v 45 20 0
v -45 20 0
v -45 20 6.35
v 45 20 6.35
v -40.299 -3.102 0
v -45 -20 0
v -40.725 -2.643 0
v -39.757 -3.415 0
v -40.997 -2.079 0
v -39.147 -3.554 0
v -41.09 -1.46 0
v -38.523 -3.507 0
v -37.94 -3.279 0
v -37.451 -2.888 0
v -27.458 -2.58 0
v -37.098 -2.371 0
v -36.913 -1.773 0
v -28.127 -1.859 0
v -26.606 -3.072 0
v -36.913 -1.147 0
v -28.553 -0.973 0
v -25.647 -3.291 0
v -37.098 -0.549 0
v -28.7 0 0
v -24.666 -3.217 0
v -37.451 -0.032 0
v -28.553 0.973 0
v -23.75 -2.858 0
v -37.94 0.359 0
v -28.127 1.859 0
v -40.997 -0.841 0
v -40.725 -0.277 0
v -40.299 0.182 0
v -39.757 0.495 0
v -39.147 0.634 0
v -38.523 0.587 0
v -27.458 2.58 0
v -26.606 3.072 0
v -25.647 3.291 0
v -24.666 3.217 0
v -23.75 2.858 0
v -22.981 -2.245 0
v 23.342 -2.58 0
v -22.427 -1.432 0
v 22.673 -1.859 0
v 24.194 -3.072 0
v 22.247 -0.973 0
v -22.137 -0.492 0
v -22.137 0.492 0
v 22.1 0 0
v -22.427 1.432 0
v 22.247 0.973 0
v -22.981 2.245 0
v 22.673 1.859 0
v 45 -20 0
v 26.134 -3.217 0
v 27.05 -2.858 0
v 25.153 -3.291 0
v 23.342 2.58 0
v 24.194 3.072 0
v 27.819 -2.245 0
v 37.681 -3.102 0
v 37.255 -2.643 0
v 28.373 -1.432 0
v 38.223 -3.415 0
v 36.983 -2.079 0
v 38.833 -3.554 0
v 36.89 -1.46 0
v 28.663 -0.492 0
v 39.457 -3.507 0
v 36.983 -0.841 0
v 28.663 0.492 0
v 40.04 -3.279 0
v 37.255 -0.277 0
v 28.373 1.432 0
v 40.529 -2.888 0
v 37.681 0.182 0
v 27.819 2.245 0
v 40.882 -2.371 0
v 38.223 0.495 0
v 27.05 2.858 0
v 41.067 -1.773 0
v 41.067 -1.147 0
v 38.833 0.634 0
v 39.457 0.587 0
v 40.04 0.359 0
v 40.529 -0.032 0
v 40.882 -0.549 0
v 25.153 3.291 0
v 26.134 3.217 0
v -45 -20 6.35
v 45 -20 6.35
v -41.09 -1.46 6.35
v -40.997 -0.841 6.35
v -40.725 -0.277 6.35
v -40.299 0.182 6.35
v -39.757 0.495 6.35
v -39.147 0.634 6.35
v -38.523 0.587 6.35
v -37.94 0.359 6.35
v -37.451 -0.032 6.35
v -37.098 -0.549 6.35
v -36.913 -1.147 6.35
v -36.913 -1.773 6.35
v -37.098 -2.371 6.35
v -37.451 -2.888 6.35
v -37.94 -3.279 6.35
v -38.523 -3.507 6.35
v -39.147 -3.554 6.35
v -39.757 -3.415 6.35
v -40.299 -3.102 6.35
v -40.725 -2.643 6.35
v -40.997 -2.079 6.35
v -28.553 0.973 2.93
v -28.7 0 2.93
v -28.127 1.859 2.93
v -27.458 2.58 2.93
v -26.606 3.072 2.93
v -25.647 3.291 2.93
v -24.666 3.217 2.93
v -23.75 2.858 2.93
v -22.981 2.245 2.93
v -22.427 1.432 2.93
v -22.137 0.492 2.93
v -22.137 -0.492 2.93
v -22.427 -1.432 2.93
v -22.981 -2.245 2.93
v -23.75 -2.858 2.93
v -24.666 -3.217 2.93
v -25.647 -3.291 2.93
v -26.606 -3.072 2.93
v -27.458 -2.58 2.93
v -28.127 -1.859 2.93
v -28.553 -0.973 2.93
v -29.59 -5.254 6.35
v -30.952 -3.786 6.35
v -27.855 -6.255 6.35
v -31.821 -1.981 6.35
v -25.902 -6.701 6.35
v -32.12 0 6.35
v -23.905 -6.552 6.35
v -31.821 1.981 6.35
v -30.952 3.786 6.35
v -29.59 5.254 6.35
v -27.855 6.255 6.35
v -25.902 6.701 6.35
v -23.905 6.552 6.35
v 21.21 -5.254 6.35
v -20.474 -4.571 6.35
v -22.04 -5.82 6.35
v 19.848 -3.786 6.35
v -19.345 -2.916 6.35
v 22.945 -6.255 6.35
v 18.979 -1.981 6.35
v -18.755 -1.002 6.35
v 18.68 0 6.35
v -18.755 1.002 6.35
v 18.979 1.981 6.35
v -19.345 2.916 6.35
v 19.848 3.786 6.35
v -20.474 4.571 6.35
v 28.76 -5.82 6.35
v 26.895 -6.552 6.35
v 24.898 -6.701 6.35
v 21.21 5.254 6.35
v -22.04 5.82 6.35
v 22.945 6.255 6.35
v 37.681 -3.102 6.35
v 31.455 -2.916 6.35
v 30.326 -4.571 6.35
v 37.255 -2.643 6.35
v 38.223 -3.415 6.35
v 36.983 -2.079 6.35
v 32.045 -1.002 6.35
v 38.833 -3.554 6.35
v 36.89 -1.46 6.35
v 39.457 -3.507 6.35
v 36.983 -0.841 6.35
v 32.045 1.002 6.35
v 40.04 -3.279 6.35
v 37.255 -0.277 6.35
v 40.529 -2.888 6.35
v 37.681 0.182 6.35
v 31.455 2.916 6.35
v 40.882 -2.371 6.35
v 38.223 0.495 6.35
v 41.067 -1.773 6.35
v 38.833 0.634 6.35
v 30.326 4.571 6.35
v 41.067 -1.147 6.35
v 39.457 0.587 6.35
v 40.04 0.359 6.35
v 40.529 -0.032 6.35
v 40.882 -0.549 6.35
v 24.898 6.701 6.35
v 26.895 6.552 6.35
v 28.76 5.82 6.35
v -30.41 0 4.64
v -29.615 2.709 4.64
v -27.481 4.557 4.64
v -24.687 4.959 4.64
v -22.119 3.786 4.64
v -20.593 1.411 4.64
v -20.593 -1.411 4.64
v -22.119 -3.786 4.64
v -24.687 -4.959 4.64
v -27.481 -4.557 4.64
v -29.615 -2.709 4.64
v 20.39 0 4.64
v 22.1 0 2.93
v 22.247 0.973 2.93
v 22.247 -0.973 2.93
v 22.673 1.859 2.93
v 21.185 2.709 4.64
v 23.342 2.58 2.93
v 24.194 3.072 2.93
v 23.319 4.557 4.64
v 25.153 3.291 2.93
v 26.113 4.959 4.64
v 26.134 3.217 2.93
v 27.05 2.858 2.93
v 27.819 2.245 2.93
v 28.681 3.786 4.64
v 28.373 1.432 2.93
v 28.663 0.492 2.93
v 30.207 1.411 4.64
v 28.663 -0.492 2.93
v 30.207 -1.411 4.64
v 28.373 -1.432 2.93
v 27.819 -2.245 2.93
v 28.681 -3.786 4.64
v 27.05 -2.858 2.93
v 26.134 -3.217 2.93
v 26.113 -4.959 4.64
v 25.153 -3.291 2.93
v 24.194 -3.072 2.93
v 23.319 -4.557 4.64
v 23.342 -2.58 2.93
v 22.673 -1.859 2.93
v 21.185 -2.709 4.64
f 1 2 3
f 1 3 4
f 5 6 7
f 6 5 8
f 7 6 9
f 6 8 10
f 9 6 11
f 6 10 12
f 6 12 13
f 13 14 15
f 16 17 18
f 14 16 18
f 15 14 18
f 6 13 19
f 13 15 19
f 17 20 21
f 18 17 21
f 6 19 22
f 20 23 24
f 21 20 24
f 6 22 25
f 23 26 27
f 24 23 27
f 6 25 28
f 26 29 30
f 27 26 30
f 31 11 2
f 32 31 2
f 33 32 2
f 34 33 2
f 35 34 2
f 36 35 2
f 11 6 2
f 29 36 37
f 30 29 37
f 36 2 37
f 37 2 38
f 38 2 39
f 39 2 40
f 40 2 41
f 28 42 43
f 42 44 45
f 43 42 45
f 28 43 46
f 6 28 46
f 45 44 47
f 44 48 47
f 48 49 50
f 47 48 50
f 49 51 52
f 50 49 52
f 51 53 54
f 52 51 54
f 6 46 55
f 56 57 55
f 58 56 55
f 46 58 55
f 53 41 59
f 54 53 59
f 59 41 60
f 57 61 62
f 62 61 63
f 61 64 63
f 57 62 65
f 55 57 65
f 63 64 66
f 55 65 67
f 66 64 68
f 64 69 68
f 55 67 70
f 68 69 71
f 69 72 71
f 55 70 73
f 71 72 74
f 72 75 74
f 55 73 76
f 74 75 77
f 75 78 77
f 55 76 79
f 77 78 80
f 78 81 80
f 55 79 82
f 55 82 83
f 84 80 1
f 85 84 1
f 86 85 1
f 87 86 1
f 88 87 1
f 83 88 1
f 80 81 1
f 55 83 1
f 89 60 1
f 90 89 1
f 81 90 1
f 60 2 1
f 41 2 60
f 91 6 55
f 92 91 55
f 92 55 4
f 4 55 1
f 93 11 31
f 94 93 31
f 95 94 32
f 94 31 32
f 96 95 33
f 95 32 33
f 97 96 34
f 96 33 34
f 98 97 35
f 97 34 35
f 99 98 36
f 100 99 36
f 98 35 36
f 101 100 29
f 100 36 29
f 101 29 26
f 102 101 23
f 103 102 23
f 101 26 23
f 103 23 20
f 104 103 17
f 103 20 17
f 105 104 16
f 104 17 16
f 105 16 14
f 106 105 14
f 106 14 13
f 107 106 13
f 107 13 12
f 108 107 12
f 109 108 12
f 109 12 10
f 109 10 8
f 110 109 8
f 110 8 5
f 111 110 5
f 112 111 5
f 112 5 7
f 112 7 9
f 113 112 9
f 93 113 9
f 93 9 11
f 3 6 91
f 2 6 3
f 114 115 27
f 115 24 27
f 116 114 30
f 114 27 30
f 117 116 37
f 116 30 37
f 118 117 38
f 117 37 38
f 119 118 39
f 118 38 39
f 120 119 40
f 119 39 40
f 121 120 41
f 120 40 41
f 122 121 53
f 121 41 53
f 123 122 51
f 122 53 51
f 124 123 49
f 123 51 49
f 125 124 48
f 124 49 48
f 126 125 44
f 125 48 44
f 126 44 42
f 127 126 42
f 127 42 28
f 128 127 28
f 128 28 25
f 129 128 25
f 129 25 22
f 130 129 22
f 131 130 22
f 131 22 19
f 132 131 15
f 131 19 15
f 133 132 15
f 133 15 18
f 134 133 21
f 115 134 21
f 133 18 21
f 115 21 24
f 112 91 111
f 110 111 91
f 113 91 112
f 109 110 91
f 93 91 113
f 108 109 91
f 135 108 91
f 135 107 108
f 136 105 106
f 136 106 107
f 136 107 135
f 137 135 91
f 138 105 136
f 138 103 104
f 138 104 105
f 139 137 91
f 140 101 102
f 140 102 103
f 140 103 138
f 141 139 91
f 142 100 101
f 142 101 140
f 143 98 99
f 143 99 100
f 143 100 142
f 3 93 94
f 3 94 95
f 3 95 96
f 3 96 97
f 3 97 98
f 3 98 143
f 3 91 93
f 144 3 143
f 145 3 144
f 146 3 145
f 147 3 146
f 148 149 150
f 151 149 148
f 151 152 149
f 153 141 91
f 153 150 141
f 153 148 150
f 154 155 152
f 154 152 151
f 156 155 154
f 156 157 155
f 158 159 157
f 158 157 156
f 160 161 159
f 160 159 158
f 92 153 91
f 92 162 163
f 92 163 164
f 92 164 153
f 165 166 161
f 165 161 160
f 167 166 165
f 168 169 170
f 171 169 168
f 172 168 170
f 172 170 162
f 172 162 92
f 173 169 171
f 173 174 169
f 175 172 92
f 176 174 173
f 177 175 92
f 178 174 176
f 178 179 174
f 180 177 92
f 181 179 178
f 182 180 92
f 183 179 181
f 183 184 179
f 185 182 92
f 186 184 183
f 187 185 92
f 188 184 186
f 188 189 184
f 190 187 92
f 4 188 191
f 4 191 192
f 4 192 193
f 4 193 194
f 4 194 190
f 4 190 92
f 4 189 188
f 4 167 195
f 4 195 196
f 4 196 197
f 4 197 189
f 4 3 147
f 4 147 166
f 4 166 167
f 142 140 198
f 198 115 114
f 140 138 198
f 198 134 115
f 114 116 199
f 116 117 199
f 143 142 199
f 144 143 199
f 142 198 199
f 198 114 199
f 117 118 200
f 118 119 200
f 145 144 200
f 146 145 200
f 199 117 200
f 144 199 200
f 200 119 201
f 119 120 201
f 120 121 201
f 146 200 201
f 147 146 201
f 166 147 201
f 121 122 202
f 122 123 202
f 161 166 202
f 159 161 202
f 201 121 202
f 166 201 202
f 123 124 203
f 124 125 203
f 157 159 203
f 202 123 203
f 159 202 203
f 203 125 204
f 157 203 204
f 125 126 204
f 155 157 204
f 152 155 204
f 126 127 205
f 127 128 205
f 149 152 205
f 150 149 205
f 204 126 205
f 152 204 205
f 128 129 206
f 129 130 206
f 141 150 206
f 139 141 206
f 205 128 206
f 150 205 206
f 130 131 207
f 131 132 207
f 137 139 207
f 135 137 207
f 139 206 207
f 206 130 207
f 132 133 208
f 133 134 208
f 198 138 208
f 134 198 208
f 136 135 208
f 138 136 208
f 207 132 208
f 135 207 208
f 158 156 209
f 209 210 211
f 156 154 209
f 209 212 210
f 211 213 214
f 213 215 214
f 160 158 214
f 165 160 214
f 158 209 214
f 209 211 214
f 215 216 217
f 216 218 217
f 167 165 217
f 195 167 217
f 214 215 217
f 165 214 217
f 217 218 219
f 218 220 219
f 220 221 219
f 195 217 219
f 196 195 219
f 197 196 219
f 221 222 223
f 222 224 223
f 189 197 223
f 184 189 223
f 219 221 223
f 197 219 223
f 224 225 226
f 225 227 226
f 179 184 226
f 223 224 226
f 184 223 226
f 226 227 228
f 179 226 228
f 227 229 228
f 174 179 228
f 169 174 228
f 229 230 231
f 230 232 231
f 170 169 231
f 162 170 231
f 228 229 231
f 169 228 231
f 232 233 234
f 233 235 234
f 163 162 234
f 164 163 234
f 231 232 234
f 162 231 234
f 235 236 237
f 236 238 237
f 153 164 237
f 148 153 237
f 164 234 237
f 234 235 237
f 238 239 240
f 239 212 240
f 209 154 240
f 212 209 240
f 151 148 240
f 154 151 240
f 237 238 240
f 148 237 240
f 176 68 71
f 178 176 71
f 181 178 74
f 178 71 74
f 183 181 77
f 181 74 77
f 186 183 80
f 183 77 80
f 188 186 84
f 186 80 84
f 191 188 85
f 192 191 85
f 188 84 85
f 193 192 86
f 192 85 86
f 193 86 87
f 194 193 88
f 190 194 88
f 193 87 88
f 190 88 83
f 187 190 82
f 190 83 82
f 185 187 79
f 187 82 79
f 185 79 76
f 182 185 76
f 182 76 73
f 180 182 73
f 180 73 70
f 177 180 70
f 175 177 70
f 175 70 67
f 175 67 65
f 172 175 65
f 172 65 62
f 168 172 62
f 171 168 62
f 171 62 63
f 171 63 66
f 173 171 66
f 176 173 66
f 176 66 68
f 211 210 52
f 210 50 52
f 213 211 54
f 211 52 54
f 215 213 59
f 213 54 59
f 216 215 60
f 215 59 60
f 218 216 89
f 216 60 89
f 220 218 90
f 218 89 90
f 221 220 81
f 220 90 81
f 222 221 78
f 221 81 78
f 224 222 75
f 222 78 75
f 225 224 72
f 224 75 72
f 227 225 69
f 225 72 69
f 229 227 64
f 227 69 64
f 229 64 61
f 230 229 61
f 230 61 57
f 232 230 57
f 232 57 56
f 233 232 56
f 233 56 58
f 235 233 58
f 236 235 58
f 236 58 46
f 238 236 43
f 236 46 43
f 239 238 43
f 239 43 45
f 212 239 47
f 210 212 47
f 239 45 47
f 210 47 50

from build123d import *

# Parameters (mm, degrees)
F0_W           = 90
F0_H           = 40
F1_DEPTH       = 6.35
F3_D           = 4.2
F4_D           = 6.6
F4_CSINK_D     = 13.44
F4_CSINK_ANGLE = 90


with BuildPart() as f1:
    # F0 (on Top) → F1 (new body)
    with BuildSketch(Plane.XY):
        Rectangle(F0_W, F0_H)
    extrude(amount=F1_DEPTH)

    # F3 (through all)
    with Locations(Plane.XY.offset(6.35)):
        with Locations((-38.99, -1.46), (38.99, -1.46)):
            Hole(F3_D / 2)

    # F4 (through all)
    with Locations(Plane.XY.offset(6.35)):
        with Locations((-25.4, 0), (25.4, 0)):
            CounterSinkHole(F4_D / 2, F4_CSINK_D / 2, counter_sink_angle=F4_CSINK_ANGLE)


solid = f1.part
